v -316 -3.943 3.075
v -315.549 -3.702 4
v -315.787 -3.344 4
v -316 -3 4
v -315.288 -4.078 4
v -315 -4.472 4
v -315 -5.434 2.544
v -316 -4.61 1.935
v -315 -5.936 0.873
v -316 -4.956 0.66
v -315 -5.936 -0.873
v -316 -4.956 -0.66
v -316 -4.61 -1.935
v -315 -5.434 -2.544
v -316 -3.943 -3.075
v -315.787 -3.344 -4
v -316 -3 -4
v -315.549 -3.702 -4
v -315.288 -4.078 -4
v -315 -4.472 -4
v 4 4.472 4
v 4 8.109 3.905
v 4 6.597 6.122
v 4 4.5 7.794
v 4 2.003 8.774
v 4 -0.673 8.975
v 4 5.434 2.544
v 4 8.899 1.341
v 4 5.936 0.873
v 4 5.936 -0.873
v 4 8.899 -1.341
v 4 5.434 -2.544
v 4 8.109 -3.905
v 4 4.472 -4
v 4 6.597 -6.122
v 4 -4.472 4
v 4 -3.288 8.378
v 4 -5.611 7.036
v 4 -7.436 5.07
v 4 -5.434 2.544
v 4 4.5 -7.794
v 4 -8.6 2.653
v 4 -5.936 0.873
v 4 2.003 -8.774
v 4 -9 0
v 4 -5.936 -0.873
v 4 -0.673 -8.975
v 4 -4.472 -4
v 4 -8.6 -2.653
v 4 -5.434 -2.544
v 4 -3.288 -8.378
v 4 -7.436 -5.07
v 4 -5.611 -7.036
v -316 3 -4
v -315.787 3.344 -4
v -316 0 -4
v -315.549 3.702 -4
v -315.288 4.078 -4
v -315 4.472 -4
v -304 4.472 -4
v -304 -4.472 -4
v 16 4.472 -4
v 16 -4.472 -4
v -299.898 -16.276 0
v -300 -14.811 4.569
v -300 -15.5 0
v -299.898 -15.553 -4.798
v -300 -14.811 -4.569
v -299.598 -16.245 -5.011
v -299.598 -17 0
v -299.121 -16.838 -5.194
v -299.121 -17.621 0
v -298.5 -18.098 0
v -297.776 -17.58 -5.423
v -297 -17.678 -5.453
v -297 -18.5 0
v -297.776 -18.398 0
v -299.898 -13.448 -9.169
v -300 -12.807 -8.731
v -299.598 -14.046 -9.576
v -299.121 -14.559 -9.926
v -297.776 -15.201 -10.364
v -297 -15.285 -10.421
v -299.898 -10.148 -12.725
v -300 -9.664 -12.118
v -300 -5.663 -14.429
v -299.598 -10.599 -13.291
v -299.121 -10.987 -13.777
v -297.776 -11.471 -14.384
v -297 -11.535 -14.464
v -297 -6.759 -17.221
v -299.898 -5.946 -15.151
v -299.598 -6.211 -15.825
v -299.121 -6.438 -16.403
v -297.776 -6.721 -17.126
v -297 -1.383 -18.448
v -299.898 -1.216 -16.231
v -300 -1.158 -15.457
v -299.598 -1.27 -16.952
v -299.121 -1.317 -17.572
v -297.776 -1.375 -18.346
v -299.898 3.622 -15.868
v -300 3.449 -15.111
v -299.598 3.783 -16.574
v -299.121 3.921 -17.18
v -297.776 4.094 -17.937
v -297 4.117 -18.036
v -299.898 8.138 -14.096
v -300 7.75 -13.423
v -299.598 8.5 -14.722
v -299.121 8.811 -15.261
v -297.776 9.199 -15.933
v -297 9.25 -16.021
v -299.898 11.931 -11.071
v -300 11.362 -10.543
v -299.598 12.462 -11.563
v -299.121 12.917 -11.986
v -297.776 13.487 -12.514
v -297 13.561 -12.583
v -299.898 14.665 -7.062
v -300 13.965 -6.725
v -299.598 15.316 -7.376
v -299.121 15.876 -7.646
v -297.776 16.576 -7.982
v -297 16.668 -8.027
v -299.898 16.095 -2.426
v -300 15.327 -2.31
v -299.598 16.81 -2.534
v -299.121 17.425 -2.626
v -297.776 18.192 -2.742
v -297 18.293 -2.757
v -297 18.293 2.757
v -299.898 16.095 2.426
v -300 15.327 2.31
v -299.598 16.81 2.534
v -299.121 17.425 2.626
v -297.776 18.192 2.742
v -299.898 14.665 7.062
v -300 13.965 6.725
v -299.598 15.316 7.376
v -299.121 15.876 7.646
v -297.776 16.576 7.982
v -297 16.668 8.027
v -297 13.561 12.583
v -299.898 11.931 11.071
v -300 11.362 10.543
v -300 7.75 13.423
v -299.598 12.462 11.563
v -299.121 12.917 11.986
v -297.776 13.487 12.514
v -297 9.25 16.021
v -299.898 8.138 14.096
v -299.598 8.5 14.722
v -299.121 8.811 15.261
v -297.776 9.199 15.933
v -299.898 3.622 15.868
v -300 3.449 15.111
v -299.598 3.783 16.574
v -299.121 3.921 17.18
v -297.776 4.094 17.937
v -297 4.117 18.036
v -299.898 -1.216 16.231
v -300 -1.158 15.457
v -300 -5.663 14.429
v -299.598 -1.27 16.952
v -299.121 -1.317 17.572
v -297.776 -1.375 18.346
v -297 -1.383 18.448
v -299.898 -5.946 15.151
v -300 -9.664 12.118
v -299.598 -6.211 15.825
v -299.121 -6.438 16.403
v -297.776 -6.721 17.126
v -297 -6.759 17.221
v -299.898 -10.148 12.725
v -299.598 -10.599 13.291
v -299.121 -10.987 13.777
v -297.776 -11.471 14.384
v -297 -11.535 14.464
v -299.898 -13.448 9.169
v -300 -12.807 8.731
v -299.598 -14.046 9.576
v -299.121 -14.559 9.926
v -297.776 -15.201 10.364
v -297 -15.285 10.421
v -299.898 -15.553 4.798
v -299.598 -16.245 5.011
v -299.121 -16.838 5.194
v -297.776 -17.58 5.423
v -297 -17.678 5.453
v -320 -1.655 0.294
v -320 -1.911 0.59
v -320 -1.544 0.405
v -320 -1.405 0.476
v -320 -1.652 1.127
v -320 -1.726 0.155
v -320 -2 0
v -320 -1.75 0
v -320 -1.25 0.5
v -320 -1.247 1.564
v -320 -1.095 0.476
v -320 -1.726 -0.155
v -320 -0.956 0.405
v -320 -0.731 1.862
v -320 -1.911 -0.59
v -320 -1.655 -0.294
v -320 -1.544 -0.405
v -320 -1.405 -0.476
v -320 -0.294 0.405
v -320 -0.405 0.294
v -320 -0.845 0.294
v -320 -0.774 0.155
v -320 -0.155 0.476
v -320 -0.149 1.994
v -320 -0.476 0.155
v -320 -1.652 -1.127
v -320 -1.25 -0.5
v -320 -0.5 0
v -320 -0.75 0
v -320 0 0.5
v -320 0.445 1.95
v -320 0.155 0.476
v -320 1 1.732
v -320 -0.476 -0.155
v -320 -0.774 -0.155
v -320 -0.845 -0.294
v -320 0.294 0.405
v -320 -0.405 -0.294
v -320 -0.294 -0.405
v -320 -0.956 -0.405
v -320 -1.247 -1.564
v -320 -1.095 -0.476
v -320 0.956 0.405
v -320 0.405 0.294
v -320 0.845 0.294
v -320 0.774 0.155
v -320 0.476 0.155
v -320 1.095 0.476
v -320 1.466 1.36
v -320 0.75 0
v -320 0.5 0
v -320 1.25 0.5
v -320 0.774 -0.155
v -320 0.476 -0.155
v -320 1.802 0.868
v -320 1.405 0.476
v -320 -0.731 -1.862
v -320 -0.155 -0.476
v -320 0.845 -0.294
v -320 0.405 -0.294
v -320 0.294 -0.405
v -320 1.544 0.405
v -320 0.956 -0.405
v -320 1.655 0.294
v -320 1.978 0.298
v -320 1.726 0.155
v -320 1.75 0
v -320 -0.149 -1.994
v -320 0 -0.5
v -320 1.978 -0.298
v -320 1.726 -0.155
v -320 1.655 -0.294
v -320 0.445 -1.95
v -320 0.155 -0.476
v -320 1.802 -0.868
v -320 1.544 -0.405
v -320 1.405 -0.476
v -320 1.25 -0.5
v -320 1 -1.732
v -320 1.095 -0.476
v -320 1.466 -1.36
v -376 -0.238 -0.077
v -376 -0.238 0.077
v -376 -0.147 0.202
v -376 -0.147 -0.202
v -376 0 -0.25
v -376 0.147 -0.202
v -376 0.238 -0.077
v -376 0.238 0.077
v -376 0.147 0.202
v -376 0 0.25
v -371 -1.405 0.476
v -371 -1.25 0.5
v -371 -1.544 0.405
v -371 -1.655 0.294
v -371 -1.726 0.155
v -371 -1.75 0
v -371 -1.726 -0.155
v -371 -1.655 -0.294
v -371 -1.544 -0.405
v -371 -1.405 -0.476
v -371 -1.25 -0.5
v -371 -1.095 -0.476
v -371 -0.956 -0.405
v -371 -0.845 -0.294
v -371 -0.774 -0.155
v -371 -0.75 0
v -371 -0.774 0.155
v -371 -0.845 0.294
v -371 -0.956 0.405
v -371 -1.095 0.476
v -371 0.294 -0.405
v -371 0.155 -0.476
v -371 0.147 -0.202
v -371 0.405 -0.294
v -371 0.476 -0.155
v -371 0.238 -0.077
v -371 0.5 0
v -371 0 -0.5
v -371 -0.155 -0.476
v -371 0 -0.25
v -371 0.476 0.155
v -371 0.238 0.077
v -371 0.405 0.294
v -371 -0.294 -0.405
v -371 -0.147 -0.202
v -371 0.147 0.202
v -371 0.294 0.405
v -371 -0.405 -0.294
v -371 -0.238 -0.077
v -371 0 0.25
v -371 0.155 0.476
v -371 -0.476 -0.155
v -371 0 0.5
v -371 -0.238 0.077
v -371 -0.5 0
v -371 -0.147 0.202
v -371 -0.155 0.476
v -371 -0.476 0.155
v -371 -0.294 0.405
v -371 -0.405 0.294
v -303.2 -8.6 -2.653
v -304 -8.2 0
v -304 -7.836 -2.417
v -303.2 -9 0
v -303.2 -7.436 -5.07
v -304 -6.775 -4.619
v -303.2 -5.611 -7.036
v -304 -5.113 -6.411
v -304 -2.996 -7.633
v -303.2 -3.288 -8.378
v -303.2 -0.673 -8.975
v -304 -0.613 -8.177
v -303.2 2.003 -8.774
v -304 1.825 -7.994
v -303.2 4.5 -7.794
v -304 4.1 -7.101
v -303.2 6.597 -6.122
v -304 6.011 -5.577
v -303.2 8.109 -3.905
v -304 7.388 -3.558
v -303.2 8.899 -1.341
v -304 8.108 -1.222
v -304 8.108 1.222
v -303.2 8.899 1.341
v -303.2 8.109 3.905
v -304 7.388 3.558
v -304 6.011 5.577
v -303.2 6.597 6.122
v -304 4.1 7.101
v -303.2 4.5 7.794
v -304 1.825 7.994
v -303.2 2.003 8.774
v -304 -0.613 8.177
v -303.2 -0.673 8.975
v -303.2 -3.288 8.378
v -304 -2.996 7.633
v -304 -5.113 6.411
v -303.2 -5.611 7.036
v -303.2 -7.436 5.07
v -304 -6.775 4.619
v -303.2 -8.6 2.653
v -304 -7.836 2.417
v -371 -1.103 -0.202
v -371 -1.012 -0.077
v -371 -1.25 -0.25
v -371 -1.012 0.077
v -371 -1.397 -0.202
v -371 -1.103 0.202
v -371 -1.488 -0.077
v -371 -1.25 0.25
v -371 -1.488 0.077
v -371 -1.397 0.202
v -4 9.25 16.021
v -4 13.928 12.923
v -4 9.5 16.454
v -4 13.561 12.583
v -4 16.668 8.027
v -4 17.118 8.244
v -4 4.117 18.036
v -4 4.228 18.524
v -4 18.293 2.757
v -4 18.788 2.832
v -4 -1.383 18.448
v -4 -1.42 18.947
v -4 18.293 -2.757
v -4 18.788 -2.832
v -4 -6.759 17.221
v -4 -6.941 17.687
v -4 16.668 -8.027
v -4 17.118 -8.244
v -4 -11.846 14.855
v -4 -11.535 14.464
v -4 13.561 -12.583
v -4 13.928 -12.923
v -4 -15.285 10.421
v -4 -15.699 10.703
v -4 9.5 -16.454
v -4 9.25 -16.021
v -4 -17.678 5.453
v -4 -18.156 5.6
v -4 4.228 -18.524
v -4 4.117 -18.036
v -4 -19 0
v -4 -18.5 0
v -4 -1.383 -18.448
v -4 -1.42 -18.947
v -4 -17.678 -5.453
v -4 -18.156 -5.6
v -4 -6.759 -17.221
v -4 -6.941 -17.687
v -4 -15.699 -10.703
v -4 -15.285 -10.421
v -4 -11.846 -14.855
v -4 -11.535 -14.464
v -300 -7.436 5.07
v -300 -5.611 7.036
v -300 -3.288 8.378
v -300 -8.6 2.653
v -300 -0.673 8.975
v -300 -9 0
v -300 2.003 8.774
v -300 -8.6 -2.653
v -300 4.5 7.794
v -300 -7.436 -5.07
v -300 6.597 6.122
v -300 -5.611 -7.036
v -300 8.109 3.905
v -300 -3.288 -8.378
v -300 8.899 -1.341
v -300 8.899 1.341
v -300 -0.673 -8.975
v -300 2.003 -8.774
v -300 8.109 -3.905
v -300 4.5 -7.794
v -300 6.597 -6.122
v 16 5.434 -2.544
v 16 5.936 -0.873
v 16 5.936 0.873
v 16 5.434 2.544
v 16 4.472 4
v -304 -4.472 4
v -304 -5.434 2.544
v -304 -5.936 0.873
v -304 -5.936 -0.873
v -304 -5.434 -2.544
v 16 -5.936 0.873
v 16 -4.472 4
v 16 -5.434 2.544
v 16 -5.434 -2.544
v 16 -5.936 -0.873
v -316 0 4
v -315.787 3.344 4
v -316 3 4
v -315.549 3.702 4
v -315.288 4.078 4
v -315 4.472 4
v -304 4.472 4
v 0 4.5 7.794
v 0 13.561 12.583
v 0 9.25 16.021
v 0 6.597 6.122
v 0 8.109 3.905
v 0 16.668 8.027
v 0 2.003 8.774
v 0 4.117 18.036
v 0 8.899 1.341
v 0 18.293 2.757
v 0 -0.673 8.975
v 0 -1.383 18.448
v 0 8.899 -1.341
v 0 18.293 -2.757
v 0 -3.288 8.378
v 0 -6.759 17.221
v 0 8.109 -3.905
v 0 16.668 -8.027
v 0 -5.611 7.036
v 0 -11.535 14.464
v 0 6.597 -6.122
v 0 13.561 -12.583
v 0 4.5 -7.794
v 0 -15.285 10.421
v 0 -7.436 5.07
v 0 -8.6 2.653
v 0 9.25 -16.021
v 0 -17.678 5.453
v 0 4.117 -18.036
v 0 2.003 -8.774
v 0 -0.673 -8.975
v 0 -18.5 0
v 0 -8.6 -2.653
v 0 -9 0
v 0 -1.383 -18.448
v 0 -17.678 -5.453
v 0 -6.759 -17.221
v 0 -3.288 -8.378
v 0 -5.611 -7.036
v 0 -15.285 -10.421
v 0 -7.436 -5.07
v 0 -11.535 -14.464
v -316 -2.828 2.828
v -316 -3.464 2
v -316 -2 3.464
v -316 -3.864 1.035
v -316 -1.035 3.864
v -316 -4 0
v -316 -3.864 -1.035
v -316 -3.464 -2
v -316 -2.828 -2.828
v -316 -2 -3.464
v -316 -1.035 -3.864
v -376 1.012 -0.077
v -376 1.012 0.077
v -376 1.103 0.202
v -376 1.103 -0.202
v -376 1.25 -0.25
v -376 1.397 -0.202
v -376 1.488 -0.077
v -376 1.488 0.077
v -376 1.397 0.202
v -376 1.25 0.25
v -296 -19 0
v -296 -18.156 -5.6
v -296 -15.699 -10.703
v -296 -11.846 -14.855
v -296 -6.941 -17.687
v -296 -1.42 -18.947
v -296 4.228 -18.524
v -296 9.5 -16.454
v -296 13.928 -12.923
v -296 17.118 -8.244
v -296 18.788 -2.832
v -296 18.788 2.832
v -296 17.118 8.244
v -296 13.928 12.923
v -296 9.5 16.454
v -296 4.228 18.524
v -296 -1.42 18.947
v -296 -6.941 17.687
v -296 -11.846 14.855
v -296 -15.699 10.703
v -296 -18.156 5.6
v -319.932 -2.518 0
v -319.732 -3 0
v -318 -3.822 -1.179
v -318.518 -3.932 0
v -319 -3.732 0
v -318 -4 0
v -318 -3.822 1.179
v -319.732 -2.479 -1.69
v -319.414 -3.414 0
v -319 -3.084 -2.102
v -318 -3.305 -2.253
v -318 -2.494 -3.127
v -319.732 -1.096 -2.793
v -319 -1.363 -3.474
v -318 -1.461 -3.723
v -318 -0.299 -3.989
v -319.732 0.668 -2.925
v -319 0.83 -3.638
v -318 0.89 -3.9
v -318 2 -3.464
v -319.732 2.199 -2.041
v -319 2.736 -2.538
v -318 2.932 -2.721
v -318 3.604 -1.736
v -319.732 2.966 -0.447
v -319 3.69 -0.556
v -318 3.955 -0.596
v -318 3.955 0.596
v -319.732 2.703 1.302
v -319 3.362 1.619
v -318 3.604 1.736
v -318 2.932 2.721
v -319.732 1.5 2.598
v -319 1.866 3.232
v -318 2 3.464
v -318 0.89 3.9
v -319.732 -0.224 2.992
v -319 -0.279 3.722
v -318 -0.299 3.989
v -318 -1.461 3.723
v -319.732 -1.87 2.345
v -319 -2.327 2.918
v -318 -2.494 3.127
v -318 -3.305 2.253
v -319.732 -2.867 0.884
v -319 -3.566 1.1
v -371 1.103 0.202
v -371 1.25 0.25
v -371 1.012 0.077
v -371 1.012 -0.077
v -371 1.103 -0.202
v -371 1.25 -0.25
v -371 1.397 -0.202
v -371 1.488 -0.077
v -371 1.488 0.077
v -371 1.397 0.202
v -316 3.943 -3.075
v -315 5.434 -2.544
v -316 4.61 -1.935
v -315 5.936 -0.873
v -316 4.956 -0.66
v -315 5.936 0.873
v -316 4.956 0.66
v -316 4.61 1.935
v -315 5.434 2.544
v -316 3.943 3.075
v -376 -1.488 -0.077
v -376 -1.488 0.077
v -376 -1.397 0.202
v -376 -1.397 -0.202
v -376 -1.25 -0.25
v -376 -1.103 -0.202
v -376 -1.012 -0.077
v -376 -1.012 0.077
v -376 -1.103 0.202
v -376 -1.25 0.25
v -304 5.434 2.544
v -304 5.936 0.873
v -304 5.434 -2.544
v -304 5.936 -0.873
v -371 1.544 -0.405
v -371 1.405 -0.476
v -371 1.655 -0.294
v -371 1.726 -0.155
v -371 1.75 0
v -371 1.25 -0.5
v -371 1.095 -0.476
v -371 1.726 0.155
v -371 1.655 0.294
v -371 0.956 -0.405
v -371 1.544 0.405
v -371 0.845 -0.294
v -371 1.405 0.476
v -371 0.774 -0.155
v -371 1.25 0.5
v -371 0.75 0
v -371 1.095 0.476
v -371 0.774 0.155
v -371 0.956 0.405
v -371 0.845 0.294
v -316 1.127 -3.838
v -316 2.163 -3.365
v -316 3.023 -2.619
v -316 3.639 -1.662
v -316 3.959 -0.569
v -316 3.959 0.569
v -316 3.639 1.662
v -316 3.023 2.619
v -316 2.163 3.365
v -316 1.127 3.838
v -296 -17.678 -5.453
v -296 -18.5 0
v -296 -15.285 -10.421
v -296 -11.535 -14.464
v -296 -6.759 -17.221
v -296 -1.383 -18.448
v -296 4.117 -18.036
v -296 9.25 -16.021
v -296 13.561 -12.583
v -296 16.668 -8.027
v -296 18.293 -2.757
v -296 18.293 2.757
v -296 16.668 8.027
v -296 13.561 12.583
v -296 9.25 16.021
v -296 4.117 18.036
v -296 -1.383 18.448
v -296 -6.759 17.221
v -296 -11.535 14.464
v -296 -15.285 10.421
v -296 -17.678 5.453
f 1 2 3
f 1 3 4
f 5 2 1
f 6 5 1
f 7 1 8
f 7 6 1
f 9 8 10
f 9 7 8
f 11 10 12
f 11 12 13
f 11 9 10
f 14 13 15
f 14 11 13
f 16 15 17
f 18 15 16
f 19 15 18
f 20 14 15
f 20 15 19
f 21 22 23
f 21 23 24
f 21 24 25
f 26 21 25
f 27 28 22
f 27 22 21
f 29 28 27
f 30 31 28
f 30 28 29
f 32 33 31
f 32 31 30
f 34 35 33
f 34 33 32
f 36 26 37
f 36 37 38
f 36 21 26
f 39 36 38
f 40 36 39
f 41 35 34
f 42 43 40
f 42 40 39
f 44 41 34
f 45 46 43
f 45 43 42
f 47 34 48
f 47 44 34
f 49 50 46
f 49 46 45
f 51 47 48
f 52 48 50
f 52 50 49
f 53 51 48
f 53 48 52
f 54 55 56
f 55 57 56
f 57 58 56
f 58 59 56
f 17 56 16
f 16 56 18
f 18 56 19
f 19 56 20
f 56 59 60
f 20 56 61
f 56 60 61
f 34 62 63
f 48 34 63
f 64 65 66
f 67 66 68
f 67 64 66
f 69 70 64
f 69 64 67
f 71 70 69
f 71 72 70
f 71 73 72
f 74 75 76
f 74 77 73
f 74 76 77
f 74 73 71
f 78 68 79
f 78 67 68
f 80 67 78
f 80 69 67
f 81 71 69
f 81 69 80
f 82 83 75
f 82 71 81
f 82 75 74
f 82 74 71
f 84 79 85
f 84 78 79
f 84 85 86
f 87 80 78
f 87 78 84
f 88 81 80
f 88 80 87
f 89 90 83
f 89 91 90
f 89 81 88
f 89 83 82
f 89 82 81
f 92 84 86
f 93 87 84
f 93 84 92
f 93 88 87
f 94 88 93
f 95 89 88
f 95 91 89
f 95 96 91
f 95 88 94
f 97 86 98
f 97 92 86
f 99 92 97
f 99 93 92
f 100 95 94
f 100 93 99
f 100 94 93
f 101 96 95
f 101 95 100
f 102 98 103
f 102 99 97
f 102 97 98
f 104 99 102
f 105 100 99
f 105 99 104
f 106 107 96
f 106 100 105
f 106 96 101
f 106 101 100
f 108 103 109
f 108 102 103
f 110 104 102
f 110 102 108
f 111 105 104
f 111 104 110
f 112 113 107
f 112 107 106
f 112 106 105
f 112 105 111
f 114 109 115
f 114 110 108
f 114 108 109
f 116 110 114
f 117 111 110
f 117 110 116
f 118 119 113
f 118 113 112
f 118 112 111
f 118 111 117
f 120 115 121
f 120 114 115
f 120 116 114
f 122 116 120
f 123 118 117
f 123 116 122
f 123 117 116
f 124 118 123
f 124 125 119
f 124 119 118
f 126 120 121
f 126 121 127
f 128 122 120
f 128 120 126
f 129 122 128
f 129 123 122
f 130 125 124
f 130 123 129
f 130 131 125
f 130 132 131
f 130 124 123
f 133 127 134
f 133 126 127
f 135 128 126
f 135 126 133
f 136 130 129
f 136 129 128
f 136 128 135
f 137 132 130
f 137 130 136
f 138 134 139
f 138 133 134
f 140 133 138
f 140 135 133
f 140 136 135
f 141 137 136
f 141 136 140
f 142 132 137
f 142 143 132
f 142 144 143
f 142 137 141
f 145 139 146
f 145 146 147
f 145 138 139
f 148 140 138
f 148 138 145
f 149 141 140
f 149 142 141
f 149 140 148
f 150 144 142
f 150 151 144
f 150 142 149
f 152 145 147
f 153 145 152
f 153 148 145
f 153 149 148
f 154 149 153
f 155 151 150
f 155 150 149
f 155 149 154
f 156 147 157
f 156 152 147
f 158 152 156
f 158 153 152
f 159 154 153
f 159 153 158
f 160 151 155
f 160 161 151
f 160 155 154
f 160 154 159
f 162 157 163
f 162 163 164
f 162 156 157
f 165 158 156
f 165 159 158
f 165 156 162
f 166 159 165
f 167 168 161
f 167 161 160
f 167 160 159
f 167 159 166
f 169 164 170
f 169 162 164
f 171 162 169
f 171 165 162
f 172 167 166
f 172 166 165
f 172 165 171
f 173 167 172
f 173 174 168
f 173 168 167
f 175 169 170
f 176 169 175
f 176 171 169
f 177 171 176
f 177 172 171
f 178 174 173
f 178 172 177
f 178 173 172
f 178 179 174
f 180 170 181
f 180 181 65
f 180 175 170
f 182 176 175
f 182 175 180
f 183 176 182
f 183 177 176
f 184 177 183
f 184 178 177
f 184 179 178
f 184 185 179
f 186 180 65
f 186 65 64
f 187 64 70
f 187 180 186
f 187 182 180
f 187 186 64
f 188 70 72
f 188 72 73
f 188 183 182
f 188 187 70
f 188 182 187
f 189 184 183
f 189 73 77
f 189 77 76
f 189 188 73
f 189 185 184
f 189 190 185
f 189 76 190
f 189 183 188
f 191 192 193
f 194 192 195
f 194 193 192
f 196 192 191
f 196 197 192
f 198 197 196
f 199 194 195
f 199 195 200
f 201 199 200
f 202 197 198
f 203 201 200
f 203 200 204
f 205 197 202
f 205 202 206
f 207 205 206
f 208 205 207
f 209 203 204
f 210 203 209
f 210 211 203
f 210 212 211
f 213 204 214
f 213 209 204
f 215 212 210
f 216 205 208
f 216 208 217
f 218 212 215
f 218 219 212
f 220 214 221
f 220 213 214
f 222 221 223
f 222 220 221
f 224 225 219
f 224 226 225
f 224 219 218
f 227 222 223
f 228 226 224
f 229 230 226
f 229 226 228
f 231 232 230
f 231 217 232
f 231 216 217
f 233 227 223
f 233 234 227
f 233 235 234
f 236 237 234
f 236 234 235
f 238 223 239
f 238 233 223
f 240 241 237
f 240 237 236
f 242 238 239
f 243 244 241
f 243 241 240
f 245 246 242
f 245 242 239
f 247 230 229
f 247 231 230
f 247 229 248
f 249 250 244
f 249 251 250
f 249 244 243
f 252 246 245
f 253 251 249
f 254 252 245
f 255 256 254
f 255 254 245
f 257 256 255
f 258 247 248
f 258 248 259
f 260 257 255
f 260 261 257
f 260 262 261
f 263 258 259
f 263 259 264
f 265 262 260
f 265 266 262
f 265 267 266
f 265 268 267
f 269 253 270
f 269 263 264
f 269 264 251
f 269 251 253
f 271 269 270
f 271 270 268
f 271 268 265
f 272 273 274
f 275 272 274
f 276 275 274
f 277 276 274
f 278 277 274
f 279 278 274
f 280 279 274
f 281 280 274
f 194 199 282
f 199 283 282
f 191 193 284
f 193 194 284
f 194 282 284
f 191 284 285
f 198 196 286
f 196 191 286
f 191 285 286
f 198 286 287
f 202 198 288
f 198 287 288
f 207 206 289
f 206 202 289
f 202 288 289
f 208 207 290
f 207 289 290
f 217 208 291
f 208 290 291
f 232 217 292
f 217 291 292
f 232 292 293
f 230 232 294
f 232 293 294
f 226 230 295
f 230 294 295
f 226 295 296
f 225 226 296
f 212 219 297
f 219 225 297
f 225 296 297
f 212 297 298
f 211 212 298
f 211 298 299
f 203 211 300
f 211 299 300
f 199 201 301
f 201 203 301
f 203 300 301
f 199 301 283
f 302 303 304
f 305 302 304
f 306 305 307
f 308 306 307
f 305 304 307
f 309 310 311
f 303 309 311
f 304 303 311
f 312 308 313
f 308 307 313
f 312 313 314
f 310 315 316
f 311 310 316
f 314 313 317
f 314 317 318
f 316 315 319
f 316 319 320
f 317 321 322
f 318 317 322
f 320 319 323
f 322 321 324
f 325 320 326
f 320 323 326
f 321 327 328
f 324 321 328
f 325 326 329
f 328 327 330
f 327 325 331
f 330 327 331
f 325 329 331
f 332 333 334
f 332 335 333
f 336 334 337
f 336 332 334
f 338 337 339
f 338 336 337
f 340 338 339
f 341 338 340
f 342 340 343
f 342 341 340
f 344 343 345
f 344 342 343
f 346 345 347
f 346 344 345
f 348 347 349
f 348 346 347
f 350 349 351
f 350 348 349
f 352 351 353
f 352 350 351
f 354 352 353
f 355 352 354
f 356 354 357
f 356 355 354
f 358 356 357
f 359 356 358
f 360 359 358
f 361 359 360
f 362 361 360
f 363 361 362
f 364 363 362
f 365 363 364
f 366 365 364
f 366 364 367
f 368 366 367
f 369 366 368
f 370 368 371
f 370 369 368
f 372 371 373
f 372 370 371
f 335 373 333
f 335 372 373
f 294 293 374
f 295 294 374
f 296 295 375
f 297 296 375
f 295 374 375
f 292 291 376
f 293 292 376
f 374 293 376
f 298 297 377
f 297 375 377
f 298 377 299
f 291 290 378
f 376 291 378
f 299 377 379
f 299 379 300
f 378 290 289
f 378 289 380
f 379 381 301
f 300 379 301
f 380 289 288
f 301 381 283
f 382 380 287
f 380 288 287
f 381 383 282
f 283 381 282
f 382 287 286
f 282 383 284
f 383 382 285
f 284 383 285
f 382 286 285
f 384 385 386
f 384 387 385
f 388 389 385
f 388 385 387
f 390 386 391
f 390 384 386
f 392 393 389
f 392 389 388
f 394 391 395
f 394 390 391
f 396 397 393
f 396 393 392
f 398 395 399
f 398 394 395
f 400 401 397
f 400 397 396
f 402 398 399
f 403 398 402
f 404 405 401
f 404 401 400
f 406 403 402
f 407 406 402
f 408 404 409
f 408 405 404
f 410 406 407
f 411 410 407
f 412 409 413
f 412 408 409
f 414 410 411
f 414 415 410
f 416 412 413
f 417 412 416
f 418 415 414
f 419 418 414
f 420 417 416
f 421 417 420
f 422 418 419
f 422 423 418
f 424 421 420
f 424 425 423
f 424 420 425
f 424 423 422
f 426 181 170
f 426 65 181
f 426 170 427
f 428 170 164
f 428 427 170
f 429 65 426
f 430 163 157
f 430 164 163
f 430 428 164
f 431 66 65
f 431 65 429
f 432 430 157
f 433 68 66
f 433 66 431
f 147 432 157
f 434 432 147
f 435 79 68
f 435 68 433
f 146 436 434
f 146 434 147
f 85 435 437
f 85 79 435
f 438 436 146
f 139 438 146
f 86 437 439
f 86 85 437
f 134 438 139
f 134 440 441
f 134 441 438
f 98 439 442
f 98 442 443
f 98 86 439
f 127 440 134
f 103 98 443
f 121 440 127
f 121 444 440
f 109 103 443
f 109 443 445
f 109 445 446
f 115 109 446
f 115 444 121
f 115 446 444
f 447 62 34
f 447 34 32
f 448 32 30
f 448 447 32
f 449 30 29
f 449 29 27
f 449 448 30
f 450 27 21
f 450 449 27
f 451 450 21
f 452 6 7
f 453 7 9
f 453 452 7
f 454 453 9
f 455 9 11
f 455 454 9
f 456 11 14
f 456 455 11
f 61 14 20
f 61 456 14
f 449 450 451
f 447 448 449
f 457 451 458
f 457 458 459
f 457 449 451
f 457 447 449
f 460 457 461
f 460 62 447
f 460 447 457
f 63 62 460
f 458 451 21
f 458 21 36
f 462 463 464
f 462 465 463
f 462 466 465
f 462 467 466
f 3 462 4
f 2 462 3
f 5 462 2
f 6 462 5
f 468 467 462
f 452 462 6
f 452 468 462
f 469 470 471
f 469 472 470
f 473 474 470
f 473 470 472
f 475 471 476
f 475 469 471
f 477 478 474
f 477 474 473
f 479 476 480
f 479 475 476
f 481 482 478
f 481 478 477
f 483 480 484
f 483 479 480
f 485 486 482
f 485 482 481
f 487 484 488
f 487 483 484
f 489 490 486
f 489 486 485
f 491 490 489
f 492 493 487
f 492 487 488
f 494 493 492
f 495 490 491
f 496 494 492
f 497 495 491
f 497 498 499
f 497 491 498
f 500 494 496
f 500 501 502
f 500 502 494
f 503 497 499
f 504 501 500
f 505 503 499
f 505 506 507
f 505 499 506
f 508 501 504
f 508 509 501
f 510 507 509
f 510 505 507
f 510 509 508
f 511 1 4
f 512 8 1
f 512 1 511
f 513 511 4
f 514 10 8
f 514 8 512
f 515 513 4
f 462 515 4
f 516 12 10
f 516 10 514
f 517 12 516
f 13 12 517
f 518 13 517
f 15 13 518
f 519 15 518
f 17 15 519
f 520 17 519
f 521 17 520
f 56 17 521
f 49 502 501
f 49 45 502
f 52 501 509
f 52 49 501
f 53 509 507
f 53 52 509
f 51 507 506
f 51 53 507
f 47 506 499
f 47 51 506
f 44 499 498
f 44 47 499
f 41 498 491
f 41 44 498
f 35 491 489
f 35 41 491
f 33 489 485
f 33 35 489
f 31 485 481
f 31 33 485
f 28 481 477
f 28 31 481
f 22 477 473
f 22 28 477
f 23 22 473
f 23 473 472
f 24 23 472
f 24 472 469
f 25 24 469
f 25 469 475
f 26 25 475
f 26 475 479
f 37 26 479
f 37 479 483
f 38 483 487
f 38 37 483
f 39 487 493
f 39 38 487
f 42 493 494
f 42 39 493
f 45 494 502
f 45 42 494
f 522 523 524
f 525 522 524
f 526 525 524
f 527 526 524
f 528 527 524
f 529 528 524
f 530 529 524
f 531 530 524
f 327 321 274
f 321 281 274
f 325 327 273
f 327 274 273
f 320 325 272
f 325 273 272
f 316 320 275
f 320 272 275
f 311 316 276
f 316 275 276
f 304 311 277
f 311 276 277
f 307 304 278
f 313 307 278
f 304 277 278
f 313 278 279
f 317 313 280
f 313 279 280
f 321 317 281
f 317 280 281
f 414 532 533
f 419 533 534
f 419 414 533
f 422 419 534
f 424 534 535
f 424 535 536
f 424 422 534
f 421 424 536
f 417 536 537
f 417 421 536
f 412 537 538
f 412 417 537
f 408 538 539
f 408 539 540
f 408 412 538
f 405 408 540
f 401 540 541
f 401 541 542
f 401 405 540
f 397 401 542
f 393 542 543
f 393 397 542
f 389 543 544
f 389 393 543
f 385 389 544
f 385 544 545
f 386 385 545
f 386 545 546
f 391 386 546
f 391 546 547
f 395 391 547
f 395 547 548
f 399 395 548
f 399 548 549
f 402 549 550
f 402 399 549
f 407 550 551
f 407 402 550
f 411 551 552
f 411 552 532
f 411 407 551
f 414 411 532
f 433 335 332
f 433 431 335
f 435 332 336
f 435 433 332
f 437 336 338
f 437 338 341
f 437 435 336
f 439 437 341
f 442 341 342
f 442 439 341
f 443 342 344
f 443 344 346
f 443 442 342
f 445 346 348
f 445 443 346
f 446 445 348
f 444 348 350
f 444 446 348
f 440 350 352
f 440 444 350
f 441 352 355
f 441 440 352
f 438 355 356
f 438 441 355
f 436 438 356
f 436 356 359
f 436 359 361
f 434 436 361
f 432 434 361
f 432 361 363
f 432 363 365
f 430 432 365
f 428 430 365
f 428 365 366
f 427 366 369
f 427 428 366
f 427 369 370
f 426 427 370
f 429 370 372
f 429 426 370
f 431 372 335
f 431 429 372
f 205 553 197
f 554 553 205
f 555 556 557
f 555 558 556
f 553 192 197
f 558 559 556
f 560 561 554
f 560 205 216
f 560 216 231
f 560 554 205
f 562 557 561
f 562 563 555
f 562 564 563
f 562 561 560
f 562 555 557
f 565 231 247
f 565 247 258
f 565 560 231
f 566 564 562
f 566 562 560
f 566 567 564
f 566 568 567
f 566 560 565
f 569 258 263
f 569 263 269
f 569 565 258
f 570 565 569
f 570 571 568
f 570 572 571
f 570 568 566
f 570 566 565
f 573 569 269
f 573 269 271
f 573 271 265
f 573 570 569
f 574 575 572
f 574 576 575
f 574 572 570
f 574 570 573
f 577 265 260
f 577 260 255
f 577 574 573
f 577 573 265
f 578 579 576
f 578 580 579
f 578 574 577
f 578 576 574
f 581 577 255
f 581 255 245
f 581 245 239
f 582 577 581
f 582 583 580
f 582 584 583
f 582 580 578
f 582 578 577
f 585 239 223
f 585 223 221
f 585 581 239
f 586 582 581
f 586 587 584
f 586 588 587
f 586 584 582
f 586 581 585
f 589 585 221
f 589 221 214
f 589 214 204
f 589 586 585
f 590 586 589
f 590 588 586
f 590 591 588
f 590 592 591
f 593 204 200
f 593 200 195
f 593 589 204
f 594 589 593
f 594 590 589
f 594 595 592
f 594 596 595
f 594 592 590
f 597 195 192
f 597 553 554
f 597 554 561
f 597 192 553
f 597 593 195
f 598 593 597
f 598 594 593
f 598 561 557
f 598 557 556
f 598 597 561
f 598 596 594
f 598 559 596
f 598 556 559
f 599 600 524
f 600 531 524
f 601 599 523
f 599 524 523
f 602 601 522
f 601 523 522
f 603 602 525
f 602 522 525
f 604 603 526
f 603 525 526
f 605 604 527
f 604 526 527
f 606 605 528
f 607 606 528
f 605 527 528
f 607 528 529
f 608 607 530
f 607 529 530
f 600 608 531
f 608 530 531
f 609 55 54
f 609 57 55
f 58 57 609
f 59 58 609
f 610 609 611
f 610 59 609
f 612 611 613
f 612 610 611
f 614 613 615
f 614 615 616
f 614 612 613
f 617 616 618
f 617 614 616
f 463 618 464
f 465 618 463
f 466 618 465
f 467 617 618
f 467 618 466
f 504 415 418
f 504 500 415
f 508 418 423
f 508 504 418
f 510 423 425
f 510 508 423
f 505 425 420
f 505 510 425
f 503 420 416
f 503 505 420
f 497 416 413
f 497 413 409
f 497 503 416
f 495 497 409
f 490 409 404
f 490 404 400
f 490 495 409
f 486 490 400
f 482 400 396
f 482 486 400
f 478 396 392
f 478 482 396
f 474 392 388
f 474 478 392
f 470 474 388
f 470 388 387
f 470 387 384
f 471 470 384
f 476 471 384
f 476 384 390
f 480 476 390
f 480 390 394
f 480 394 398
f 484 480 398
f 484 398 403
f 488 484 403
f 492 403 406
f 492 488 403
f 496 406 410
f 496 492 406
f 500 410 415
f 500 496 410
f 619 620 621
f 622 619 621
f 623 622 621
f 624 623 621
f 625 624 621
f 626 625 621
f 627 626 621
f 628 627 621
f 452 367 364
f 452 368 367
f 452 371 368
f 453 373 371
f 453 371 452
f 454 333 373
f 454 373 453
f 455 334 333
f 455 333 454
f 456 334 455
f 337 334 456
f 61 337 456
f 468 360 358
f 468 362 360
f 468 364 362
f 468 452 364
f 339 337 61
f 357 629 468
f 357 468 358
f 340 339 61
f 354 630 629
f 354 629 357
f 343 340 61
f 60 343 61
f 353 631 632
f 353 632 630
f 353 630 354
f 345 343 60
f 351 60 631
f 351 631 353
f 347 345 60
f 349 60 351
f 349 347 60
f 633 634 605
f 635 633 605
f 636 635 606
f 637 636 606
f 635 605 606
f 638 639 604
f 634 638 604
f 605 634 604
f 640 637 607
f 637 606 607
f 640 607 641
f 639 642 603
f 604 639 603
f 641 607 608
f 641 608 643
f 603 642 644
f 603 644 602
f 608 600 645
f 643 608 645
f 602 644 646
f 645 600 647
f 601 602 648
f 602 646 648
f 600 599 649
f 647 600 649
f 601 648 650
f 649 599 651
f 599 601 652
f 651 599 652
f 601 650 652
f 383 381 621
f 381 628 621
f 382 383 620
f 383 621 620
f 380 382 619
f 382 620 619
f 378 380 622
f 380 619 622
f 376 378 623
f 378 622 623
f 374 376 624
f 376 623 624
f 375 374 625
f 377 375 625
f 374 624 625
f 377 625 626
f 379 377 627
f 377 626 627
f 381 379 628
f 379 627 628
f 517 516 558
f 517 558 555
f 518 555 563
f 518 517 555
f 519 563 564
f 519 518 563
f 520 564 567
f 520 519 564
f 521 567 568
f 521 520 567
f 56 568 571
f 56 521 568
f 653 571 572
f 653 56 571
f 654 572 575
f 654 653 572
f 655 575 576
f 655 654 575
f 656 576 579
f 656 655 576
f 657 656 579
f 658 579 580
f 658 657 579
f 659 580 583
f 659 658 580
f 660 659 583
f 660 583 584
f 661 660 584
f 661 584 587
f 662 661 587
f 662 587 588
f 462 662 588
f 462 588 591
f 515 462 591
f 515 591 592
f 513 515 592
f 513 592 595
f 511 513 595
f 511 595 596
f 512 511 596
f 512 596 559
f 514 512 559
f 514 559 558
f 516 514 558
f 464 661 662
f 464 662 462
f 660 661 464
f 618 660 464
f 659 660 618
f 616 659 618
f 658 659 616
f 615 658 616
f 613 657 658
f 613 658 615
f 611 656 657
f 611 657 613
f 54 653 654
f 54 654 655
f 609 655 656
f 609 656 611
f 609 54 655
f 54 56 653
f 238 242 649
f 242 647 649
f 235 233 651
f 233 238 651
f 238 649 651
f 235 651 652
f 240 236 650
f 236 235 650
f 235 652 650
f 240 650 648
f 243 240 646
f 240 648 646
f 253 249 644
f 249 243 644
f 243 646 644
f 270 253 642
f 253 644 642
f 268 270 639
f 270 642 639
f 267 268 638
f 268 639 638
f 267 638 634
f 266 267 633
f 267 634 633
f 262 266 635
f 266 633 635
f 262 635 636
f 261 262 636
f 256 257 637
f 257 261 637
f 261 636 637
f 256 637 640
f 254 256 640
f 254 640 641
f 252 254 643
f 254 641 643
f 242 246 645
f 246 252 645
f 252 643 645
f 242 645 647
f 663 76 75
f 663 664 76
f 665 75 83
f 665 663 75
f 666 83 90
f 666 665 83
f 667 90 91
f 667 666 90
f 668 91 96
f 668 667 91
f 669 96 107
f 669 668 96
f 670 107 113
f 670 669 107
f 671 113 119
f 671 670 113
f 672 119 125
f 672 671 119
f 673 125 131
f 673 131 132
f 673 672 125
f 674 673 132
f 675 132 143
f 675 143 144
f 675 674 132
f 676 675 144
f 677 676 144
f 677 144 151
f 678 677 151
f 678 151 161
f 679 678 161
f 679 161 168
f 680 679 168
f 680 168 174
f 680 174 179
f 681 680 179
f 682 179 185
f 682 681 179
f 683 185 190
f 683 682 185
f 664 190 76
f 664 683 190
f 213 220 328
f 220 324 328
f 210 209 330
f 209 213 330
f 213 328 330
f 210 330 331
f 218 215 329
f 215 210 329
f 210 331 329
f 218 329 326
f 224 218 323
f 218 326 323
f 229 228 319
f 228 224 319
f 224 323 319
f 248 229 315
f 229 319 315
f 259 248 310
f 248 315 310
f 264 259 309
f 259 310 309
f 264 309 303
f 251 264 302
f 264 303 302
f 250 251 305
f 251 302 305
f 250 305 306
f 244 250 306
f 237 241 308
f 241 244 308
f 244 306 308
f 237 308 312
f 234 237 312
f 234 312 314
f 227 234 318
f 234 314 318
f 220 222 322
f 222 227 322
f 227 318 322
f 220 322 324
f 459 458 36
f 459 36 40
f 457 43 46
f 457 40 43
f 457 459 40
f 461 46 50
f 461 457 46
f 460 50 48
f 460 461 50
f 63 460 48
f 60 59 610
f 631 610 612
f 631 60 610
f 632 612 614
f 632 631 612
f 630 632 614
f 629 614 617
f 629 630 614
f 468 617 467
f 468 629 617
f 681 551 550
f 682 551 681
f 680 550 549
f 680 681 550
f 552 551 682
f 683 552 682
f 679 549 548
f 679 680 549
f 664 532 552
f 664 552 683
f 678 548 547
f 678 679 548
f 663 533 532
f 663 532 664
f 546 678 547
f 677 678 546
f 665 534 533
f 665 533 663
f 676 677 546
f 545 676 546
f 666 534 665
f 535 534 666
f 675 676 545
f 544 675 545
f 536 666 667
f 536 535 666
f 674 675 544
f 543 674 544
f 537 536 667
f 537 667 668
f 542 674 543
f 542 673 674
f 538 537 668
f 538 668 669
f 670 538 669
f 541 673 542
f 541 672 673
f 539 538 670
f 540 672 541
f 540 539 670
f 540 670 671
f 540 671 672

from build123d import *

# Parameters (mm, degrees)
CUT_EXTRUDE1_DEPTH = 326.112288294
CUT_EXTRUDE2_DEPTH = 322.126143439
LPATTERN1_COUNT    = 3
LPATTERN1_PITCH    = 1.25


with BuildPart() as part:
    # Sketch2 → Revolve2 (revolve)
    with BuildSketch(Plane.XY, mode=Mode.PRIVATE) as revolve2_sk:
        with BuildLine():
            Line((-4, 18.5), (0, 18.5))
            Line((0, 18.5), (0, 9))
            Line((0, 9), (4, 9))
            Line((4, 9), (4, 6))
            Line((4, 6), (16, 6))
            Line((16, 6), (16, 0))
            Line((16, 0), (-320, 0))
            Line((-320, 0), (-320, 2))
            ThreePointArc((-320, 2), (-319.414213562, 3.414213562), (-318, 4))
            Line((-318, 4), (-316, 4))
            Line((-316, 4), (-316, 5))
            Line((-316, 5), (-315, 6))
            Line((-315, 6), (-304, 6))
            Line((-304, 6), (-304, 8.2))
            Line((-304, 8.2), (-303.2, 9))
            Line((-303.2, 9), (-300, 9))
            Line((-300, 9), (-300, 15.5))
            ThreePointArc((-300, 15.5), (-299.121320344, 17.621320344), (-297, 18.5))
            Line((-297, 18.5), (-296, 18.5))
            Line((-296, 18.5), (-296, 19))
            Line((-296, 19), (-4, 19))
            Line((-4, 19), (-4, 18.5))
        make_face()
    revolve(revolve2_sk.sketch.rotate(Axis((-320, 0, 0), (1, 0, 0)), 180), axis=Axis((-320, 0, 0), (1, 0, 0)))

    # Sketch3 → Cut-Extrude1 (cut, through all)
    with BuildSketch(Plane(origin=(4, 0, 0), x_dir=(0, 0, -1), z_dir=(1, 0, 0))):
        with BuildLine():
            Line((-4, 4.472135955), (-4, -4.472135955))
            ThreePointArc((-4, -4.472135955), (-6, 0), (-4, 4.472135955))
        make_face()
        with BuildLine():
            Line((4, 4.472135955), (4, -4.472135955))
            ThreePointArc((4, -4.472135955), (6, 0), (4, 4.472135955))
        make_face()
    extrude(amount=CUT_EXTRUDE1_DEPTH, mode=Mode.SUBTRACT)

    # Sketch4 → Cut-Extrude2 (cut, through all)
    with BuildSketch(Plane(origin=(-304, 0, 0), x_dir=(0, 0, -1), z_dir=(1, 0, 0))):
        with BuildLine():
            Line((-4, 4.472135955), (-4, -4.472135955))
            ThreePointArc((-4, -4.472135955), (-6, 0), (-4, 4.472135955))
        make_face()
        with BuildLine():
            Line((4, 4.472135955), (4, -4.472135955))
            ThreePointArc((4, -4.472135955), (6, 0), (4, 4.472135955))
        make_face()
    extrude(amount=-CUT_EXTRUDE2_DEPTH, mode=Mode.SUBTRACT)

    # Sketch8 → Revolve3 (revolve)
    with BuildSketch(Plane.XY, mode=Mode.PRIVATE) as revolve3_sk:
        Polygon((-316, 1.75), (-371, 1.75), (-371, 1.5), (-376, 1.5), (-376, 1.25), (-316, 1.25), align=None)
    revolve3 = revolve(revolve3_sk.sketch.rotate(Axis((-377.615440864, 1.25, 0), (1, 0, 0)), 90), axis=Axis((-377.615440864, 1.25, 0), (1, 0, 0)))

    # LPattern1: Revolve3 ×3
    with Locations(*[(0, -i * LPATTERN1_PITCH, 0) for i in range(1, LPATTERN1_COUNT)]):
        add(revolve3)


solid = part.part
